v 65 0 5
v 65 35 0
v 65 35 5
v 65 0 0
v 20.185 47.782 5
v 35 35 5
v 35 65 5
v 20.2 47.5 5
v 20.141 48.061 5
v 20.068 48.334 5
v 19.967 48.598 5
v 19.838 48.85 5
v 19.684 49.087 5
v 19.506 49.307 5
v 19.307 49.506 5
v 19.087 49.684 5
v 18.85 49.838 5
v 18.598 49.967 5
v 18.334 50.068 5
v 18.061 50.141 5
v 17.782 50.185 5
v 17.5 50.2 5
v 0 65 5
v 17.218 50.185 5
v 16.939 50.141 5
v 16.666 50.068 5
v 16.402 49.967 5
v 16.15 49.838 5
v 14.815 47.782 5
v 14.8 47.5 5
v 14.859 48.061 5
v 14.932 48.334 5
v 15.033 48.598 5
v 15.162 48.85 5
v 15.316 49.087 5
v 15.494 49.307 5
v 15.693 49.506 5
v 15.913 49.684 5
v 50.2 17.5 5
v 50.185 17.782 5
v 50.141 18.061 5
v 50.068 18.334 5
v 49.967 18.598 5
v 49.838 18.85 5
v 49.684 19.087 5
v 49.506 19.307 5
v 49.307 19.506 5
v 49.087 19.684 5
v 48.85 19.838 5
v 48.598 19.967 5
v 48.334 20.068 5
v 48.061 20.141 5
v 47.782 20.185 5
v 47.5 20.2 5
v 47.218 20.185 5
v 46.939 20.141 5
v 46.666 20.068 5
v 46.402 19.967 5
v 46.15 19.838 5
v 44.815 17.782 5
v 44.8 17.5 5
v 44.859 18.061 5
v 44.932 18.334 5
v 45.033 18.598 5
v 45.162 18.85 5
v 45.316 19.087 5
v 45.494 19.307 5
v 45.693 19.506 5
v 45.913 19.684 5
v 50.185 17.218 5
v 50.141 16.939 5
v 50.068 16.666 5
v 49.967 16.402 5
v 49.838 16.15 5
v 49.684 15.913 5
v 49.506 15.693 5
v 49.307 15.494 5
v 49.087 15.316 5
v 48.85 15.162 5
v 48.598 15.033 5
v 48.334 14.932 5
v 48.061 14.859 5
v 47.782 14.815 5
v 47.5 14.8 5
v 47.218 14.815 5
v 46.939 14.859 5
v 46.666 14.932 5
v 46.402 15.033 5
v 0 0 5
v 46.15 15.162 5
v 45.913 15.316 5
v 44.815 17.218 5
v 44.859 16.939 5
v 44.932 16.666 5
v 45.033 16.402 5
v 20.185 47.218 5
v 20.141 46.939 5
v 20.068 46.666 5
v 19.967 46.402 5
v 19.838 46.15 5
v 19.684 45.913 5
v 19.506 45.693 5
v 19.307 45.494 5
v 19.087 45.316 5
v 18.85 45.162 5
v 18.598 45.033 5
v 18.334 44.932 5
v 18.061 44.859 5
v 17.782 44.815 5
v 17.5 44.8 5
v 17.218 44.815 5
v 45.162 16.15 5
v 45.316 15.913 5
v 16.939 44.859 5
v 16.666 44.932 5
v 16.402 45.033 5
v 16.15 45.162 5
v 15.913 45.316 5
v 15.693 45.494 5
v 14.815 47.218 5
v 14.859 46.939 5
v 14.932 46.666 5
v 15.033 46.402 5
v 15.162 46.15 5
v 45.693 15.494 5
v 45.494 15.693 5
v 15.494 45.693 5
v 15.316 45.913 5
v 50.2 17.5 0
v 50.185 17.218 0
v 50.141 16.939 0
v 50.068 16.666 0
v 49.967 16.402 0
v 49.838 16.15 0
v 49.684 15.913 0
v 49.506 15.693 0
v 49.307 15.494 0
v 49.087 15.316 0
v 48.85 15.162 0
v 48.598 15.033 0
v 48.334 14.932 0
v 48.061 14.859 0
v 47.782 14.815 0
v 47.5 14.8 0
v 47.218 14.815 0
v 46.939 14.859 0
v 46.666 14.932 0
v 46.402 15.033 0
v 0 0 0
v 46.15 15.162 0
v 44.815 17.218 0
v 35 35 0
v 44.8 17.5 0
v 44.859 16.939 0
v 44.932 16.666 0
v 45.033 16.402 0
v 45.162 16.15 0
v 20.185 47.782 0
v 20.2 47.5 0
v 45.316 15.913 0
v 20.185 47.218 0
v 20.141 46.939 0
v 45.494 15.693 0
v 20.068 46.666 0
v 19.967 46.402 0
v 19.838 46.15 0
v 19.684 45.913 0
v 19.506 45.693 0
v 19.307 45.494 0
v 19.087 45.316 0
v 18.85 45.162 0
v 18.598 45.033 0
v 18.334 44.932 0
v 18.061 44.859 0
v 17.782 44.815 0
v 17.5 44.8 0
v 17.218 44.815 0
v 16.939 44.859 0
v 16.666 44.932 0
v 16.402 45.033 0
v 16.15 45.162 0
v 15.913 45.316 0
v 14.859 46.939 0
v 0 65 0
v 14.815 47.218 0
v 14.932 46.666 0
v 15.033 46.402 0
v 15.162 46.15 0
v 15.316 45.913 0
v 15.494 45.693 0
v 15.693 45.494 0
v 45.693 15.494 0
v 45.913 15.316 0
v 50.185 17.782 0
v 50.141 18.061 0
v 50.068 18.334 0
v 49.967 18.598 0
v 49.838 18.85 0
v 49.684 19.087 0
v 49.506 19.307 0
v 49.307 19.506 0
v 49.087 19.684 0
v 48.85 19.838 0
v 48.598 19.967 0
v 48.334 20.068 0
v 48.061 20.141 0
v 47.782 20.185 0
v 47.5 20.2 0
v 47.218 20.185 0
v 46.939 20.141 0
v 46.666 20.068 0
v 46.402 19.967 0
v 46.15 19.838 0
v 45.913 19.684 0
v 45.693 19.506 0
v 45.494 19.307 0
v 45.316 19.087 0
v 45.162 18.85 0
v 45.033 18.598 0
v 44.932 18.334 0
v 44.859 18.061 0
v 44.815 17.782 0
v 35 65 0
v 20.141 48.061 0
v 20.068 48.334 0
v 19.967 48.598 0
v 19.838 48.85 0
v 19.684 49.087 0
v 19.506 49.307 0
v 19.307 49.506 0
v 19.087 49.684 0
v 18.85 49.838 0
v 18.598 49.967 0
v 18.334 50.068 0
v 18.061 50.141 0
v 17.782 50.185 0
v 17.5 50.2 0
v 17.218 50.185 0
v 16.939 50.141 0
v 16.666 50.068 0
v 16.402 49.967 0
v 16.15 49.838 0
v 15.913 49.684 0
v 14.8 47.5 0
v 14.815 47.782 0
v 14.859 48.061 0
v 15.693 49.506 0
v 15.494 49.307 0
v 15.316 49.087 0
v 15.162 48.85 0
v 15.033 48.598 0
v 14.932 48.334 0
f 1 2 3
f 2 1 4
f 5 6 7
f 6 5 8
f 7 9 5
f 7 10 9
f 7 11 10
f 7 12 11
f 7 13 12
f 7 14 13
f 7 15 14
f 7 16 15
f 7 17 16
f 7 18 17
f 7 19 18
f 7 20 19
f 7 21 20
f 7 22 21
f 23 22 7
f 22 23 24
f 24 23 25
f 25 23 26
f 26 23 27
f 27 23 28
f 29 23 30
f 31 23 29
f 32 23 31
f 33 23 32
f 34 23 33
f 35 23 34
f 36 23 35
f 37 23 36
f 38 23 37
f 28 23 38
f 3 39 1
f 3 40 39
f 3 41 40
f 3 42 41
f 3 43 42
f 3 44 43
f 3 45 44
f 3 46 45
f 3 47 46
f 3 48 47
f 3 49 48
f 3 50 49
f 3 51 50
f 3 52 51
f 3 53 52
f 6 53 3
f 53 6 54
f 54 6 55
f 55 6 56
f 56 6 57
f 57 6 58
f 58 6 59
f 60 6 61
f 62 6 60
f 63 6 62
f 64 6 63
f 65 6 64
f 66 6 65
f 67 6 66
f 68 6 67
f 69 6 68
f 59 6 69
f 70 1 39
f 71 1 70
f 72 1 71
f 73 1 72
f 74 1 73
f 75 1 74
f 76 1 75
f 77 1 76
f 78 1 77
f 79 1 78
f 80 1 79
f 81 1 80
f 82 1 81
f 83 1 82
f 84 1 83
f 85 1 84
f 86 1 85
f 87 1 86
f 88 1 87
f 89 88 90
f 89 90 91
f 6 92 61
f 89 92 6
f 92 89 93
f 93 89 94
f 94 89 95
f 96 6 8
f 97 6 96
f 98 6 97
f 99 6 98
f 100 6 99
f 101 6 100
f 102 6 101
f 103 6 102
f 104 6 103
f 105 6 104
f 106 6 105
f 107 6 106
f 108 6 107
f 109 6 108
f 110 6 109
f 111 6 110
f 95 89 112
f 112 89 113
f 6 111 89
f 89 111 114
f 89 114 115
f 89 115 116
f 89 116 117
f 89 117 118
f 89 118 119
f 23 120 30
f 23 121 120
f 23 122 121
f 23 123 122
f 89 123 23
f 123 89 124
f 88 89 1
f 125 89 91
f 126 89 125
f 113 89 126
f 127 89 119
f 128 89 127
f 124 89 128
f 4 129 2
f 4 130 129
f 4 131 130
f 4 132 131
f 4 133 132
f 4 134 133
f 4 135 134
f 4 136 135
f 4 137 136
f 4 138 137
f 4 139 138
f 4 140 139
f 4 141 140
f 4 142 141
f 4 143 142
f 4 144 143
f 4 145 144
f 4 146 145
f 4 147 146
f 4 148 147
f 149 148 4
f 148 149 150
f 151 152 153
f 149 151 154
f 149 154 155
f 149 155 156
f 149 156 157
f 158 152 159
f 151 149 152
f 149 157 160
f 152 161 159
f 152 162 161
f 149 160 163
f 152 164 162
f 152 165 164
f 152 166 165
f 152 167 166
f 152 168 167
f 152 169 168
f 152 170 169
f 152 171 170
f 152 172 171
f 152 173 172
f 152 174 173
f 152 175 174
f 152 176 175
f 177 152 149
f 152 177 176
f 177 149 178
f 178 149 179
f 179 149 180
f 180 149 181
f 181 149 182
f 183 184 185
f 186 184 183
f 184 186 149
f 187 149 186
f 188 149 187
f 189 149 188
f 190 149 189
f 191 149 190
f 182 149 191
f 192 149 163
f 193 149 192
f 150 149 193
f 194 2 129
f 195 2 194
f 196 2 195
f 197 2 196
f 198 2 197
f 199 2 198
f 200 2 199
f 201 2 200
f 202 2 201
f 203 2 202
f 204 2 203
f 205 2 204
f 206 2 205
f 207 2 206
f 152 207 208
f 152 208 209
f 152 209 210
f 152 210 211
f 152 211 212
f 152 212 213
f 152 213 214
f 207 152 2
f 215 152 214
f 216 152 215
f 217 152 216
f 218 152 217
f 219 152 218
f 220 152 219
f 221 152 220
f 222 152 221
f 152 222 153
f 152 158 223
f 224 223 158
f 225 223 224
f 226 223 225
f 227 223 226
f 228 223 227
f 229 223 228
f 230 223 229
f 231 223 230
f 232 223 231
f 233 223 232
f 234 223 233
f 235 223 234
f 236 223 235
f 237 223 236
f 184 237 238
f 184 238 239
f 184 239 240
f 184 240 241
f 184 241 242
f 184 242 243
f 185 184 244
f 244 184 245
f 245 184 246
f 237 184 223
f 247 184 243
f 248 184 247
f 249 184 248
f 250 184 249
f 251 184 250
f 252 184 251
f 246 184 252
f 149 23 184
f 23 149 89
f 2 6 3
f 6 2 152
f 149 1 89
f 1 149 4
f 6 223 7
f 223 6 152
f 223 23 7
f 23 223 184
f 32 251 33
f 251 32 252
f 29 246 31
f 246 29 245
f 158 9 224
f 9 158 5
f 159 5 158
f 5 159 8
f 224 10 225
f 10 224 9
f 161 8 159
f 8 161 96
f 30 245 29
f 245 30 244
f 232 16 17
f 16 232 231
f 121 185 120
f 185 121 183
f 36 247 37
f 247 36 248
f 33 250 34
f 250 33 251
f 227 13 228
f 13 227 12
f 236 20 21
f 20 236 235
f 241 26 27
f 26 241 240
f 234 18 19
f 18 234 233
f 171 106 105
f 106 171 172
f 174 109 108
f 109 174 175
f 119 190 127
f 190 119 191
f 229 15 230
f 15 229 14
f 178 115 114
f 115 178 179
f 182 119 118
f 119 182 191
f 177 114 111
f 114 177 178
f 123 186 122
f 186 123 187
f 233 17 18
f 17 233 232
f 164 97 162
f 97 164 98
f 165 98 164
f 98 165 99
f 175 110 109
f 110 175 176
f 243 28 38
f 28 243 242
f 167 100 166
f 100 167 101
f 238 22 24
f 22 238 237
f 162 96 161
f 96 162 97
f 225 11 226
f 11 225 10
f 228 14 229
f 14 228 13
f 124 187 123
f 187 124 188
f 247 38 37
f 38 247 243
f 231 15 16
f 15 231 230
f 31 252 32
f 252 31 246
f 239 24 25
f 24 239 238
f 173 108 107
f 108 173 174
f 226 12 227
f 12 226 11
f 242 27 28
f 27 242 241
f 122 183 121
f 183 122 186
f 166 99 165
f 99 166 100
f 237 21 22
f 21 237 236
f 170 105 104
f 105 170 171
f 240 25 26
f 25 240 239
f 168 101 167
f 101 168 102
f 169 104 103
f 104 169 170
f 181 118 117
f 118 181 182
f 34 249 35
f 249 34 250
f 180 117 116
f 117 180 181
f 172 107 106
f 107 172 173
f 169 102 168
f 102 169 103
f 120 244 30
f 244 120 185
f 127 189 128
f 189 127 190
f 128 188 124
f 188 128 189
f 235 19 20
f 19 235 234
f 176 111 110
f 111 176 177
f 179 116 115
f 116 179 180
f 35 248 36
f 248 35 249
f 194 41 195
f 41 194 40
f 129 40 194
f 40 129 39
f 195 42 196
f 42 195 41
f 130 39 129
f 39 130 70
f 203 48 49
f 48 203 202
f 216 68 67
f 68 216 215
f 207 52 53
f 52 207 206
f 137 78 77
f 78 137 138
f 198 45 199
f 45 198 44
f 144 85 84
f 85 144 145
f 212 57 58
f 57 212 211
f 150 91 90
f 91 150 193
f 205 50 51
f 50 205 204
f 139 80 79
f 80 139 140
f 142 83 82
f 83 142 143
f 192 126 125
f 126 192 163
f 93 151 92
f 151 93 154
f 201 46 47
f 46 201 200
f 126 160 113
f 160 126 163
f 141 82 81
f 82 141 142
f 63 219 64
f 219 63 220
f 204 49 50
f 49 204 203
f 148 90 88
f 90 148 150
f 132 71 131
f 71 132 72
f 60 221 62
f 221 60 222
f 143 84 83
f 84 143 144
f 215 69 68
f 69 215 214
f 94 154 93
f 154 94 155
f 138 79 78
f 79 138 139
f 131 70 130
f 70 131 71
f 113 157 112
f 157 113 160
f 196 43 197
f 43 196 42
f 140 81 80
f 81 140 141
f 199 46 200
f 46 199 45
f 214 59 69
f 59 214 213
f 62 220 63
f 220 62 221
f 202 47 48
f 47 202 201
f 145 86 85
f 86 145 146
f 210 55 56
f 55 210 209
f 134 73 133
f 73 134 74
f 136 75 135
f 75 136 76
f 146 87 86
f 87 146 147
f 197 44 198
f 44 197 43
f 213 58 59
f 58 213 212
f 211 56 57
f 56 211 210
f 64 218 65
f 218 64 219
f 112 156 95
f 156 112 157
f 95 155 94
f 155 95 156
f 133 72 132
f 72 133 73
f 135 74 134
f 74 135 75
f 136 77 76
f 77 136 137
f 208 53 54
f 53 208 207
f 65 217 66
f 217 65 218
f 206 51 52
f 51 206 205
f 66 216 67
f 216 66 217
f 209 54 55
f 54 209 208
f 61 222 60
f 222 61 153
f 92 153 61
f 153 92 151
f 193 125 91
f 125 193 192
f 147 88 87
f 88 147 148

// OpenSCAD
// V-slot corner connector.
$fn = 60;
eps = 0.02;
profile = 35;
arm = 65;
plate_t = 5;
difference() {
    union() { cube([arm,profile,plate_t]); cube([profile,arm,plate_t]); }
    for (p=[[profile/2,arm-profile/2],[arm-profile/2,profile/2]]) translate([p[0],p[1],-eps]) cylinder(d=5.4,h=plate_t+2*eps);
}
